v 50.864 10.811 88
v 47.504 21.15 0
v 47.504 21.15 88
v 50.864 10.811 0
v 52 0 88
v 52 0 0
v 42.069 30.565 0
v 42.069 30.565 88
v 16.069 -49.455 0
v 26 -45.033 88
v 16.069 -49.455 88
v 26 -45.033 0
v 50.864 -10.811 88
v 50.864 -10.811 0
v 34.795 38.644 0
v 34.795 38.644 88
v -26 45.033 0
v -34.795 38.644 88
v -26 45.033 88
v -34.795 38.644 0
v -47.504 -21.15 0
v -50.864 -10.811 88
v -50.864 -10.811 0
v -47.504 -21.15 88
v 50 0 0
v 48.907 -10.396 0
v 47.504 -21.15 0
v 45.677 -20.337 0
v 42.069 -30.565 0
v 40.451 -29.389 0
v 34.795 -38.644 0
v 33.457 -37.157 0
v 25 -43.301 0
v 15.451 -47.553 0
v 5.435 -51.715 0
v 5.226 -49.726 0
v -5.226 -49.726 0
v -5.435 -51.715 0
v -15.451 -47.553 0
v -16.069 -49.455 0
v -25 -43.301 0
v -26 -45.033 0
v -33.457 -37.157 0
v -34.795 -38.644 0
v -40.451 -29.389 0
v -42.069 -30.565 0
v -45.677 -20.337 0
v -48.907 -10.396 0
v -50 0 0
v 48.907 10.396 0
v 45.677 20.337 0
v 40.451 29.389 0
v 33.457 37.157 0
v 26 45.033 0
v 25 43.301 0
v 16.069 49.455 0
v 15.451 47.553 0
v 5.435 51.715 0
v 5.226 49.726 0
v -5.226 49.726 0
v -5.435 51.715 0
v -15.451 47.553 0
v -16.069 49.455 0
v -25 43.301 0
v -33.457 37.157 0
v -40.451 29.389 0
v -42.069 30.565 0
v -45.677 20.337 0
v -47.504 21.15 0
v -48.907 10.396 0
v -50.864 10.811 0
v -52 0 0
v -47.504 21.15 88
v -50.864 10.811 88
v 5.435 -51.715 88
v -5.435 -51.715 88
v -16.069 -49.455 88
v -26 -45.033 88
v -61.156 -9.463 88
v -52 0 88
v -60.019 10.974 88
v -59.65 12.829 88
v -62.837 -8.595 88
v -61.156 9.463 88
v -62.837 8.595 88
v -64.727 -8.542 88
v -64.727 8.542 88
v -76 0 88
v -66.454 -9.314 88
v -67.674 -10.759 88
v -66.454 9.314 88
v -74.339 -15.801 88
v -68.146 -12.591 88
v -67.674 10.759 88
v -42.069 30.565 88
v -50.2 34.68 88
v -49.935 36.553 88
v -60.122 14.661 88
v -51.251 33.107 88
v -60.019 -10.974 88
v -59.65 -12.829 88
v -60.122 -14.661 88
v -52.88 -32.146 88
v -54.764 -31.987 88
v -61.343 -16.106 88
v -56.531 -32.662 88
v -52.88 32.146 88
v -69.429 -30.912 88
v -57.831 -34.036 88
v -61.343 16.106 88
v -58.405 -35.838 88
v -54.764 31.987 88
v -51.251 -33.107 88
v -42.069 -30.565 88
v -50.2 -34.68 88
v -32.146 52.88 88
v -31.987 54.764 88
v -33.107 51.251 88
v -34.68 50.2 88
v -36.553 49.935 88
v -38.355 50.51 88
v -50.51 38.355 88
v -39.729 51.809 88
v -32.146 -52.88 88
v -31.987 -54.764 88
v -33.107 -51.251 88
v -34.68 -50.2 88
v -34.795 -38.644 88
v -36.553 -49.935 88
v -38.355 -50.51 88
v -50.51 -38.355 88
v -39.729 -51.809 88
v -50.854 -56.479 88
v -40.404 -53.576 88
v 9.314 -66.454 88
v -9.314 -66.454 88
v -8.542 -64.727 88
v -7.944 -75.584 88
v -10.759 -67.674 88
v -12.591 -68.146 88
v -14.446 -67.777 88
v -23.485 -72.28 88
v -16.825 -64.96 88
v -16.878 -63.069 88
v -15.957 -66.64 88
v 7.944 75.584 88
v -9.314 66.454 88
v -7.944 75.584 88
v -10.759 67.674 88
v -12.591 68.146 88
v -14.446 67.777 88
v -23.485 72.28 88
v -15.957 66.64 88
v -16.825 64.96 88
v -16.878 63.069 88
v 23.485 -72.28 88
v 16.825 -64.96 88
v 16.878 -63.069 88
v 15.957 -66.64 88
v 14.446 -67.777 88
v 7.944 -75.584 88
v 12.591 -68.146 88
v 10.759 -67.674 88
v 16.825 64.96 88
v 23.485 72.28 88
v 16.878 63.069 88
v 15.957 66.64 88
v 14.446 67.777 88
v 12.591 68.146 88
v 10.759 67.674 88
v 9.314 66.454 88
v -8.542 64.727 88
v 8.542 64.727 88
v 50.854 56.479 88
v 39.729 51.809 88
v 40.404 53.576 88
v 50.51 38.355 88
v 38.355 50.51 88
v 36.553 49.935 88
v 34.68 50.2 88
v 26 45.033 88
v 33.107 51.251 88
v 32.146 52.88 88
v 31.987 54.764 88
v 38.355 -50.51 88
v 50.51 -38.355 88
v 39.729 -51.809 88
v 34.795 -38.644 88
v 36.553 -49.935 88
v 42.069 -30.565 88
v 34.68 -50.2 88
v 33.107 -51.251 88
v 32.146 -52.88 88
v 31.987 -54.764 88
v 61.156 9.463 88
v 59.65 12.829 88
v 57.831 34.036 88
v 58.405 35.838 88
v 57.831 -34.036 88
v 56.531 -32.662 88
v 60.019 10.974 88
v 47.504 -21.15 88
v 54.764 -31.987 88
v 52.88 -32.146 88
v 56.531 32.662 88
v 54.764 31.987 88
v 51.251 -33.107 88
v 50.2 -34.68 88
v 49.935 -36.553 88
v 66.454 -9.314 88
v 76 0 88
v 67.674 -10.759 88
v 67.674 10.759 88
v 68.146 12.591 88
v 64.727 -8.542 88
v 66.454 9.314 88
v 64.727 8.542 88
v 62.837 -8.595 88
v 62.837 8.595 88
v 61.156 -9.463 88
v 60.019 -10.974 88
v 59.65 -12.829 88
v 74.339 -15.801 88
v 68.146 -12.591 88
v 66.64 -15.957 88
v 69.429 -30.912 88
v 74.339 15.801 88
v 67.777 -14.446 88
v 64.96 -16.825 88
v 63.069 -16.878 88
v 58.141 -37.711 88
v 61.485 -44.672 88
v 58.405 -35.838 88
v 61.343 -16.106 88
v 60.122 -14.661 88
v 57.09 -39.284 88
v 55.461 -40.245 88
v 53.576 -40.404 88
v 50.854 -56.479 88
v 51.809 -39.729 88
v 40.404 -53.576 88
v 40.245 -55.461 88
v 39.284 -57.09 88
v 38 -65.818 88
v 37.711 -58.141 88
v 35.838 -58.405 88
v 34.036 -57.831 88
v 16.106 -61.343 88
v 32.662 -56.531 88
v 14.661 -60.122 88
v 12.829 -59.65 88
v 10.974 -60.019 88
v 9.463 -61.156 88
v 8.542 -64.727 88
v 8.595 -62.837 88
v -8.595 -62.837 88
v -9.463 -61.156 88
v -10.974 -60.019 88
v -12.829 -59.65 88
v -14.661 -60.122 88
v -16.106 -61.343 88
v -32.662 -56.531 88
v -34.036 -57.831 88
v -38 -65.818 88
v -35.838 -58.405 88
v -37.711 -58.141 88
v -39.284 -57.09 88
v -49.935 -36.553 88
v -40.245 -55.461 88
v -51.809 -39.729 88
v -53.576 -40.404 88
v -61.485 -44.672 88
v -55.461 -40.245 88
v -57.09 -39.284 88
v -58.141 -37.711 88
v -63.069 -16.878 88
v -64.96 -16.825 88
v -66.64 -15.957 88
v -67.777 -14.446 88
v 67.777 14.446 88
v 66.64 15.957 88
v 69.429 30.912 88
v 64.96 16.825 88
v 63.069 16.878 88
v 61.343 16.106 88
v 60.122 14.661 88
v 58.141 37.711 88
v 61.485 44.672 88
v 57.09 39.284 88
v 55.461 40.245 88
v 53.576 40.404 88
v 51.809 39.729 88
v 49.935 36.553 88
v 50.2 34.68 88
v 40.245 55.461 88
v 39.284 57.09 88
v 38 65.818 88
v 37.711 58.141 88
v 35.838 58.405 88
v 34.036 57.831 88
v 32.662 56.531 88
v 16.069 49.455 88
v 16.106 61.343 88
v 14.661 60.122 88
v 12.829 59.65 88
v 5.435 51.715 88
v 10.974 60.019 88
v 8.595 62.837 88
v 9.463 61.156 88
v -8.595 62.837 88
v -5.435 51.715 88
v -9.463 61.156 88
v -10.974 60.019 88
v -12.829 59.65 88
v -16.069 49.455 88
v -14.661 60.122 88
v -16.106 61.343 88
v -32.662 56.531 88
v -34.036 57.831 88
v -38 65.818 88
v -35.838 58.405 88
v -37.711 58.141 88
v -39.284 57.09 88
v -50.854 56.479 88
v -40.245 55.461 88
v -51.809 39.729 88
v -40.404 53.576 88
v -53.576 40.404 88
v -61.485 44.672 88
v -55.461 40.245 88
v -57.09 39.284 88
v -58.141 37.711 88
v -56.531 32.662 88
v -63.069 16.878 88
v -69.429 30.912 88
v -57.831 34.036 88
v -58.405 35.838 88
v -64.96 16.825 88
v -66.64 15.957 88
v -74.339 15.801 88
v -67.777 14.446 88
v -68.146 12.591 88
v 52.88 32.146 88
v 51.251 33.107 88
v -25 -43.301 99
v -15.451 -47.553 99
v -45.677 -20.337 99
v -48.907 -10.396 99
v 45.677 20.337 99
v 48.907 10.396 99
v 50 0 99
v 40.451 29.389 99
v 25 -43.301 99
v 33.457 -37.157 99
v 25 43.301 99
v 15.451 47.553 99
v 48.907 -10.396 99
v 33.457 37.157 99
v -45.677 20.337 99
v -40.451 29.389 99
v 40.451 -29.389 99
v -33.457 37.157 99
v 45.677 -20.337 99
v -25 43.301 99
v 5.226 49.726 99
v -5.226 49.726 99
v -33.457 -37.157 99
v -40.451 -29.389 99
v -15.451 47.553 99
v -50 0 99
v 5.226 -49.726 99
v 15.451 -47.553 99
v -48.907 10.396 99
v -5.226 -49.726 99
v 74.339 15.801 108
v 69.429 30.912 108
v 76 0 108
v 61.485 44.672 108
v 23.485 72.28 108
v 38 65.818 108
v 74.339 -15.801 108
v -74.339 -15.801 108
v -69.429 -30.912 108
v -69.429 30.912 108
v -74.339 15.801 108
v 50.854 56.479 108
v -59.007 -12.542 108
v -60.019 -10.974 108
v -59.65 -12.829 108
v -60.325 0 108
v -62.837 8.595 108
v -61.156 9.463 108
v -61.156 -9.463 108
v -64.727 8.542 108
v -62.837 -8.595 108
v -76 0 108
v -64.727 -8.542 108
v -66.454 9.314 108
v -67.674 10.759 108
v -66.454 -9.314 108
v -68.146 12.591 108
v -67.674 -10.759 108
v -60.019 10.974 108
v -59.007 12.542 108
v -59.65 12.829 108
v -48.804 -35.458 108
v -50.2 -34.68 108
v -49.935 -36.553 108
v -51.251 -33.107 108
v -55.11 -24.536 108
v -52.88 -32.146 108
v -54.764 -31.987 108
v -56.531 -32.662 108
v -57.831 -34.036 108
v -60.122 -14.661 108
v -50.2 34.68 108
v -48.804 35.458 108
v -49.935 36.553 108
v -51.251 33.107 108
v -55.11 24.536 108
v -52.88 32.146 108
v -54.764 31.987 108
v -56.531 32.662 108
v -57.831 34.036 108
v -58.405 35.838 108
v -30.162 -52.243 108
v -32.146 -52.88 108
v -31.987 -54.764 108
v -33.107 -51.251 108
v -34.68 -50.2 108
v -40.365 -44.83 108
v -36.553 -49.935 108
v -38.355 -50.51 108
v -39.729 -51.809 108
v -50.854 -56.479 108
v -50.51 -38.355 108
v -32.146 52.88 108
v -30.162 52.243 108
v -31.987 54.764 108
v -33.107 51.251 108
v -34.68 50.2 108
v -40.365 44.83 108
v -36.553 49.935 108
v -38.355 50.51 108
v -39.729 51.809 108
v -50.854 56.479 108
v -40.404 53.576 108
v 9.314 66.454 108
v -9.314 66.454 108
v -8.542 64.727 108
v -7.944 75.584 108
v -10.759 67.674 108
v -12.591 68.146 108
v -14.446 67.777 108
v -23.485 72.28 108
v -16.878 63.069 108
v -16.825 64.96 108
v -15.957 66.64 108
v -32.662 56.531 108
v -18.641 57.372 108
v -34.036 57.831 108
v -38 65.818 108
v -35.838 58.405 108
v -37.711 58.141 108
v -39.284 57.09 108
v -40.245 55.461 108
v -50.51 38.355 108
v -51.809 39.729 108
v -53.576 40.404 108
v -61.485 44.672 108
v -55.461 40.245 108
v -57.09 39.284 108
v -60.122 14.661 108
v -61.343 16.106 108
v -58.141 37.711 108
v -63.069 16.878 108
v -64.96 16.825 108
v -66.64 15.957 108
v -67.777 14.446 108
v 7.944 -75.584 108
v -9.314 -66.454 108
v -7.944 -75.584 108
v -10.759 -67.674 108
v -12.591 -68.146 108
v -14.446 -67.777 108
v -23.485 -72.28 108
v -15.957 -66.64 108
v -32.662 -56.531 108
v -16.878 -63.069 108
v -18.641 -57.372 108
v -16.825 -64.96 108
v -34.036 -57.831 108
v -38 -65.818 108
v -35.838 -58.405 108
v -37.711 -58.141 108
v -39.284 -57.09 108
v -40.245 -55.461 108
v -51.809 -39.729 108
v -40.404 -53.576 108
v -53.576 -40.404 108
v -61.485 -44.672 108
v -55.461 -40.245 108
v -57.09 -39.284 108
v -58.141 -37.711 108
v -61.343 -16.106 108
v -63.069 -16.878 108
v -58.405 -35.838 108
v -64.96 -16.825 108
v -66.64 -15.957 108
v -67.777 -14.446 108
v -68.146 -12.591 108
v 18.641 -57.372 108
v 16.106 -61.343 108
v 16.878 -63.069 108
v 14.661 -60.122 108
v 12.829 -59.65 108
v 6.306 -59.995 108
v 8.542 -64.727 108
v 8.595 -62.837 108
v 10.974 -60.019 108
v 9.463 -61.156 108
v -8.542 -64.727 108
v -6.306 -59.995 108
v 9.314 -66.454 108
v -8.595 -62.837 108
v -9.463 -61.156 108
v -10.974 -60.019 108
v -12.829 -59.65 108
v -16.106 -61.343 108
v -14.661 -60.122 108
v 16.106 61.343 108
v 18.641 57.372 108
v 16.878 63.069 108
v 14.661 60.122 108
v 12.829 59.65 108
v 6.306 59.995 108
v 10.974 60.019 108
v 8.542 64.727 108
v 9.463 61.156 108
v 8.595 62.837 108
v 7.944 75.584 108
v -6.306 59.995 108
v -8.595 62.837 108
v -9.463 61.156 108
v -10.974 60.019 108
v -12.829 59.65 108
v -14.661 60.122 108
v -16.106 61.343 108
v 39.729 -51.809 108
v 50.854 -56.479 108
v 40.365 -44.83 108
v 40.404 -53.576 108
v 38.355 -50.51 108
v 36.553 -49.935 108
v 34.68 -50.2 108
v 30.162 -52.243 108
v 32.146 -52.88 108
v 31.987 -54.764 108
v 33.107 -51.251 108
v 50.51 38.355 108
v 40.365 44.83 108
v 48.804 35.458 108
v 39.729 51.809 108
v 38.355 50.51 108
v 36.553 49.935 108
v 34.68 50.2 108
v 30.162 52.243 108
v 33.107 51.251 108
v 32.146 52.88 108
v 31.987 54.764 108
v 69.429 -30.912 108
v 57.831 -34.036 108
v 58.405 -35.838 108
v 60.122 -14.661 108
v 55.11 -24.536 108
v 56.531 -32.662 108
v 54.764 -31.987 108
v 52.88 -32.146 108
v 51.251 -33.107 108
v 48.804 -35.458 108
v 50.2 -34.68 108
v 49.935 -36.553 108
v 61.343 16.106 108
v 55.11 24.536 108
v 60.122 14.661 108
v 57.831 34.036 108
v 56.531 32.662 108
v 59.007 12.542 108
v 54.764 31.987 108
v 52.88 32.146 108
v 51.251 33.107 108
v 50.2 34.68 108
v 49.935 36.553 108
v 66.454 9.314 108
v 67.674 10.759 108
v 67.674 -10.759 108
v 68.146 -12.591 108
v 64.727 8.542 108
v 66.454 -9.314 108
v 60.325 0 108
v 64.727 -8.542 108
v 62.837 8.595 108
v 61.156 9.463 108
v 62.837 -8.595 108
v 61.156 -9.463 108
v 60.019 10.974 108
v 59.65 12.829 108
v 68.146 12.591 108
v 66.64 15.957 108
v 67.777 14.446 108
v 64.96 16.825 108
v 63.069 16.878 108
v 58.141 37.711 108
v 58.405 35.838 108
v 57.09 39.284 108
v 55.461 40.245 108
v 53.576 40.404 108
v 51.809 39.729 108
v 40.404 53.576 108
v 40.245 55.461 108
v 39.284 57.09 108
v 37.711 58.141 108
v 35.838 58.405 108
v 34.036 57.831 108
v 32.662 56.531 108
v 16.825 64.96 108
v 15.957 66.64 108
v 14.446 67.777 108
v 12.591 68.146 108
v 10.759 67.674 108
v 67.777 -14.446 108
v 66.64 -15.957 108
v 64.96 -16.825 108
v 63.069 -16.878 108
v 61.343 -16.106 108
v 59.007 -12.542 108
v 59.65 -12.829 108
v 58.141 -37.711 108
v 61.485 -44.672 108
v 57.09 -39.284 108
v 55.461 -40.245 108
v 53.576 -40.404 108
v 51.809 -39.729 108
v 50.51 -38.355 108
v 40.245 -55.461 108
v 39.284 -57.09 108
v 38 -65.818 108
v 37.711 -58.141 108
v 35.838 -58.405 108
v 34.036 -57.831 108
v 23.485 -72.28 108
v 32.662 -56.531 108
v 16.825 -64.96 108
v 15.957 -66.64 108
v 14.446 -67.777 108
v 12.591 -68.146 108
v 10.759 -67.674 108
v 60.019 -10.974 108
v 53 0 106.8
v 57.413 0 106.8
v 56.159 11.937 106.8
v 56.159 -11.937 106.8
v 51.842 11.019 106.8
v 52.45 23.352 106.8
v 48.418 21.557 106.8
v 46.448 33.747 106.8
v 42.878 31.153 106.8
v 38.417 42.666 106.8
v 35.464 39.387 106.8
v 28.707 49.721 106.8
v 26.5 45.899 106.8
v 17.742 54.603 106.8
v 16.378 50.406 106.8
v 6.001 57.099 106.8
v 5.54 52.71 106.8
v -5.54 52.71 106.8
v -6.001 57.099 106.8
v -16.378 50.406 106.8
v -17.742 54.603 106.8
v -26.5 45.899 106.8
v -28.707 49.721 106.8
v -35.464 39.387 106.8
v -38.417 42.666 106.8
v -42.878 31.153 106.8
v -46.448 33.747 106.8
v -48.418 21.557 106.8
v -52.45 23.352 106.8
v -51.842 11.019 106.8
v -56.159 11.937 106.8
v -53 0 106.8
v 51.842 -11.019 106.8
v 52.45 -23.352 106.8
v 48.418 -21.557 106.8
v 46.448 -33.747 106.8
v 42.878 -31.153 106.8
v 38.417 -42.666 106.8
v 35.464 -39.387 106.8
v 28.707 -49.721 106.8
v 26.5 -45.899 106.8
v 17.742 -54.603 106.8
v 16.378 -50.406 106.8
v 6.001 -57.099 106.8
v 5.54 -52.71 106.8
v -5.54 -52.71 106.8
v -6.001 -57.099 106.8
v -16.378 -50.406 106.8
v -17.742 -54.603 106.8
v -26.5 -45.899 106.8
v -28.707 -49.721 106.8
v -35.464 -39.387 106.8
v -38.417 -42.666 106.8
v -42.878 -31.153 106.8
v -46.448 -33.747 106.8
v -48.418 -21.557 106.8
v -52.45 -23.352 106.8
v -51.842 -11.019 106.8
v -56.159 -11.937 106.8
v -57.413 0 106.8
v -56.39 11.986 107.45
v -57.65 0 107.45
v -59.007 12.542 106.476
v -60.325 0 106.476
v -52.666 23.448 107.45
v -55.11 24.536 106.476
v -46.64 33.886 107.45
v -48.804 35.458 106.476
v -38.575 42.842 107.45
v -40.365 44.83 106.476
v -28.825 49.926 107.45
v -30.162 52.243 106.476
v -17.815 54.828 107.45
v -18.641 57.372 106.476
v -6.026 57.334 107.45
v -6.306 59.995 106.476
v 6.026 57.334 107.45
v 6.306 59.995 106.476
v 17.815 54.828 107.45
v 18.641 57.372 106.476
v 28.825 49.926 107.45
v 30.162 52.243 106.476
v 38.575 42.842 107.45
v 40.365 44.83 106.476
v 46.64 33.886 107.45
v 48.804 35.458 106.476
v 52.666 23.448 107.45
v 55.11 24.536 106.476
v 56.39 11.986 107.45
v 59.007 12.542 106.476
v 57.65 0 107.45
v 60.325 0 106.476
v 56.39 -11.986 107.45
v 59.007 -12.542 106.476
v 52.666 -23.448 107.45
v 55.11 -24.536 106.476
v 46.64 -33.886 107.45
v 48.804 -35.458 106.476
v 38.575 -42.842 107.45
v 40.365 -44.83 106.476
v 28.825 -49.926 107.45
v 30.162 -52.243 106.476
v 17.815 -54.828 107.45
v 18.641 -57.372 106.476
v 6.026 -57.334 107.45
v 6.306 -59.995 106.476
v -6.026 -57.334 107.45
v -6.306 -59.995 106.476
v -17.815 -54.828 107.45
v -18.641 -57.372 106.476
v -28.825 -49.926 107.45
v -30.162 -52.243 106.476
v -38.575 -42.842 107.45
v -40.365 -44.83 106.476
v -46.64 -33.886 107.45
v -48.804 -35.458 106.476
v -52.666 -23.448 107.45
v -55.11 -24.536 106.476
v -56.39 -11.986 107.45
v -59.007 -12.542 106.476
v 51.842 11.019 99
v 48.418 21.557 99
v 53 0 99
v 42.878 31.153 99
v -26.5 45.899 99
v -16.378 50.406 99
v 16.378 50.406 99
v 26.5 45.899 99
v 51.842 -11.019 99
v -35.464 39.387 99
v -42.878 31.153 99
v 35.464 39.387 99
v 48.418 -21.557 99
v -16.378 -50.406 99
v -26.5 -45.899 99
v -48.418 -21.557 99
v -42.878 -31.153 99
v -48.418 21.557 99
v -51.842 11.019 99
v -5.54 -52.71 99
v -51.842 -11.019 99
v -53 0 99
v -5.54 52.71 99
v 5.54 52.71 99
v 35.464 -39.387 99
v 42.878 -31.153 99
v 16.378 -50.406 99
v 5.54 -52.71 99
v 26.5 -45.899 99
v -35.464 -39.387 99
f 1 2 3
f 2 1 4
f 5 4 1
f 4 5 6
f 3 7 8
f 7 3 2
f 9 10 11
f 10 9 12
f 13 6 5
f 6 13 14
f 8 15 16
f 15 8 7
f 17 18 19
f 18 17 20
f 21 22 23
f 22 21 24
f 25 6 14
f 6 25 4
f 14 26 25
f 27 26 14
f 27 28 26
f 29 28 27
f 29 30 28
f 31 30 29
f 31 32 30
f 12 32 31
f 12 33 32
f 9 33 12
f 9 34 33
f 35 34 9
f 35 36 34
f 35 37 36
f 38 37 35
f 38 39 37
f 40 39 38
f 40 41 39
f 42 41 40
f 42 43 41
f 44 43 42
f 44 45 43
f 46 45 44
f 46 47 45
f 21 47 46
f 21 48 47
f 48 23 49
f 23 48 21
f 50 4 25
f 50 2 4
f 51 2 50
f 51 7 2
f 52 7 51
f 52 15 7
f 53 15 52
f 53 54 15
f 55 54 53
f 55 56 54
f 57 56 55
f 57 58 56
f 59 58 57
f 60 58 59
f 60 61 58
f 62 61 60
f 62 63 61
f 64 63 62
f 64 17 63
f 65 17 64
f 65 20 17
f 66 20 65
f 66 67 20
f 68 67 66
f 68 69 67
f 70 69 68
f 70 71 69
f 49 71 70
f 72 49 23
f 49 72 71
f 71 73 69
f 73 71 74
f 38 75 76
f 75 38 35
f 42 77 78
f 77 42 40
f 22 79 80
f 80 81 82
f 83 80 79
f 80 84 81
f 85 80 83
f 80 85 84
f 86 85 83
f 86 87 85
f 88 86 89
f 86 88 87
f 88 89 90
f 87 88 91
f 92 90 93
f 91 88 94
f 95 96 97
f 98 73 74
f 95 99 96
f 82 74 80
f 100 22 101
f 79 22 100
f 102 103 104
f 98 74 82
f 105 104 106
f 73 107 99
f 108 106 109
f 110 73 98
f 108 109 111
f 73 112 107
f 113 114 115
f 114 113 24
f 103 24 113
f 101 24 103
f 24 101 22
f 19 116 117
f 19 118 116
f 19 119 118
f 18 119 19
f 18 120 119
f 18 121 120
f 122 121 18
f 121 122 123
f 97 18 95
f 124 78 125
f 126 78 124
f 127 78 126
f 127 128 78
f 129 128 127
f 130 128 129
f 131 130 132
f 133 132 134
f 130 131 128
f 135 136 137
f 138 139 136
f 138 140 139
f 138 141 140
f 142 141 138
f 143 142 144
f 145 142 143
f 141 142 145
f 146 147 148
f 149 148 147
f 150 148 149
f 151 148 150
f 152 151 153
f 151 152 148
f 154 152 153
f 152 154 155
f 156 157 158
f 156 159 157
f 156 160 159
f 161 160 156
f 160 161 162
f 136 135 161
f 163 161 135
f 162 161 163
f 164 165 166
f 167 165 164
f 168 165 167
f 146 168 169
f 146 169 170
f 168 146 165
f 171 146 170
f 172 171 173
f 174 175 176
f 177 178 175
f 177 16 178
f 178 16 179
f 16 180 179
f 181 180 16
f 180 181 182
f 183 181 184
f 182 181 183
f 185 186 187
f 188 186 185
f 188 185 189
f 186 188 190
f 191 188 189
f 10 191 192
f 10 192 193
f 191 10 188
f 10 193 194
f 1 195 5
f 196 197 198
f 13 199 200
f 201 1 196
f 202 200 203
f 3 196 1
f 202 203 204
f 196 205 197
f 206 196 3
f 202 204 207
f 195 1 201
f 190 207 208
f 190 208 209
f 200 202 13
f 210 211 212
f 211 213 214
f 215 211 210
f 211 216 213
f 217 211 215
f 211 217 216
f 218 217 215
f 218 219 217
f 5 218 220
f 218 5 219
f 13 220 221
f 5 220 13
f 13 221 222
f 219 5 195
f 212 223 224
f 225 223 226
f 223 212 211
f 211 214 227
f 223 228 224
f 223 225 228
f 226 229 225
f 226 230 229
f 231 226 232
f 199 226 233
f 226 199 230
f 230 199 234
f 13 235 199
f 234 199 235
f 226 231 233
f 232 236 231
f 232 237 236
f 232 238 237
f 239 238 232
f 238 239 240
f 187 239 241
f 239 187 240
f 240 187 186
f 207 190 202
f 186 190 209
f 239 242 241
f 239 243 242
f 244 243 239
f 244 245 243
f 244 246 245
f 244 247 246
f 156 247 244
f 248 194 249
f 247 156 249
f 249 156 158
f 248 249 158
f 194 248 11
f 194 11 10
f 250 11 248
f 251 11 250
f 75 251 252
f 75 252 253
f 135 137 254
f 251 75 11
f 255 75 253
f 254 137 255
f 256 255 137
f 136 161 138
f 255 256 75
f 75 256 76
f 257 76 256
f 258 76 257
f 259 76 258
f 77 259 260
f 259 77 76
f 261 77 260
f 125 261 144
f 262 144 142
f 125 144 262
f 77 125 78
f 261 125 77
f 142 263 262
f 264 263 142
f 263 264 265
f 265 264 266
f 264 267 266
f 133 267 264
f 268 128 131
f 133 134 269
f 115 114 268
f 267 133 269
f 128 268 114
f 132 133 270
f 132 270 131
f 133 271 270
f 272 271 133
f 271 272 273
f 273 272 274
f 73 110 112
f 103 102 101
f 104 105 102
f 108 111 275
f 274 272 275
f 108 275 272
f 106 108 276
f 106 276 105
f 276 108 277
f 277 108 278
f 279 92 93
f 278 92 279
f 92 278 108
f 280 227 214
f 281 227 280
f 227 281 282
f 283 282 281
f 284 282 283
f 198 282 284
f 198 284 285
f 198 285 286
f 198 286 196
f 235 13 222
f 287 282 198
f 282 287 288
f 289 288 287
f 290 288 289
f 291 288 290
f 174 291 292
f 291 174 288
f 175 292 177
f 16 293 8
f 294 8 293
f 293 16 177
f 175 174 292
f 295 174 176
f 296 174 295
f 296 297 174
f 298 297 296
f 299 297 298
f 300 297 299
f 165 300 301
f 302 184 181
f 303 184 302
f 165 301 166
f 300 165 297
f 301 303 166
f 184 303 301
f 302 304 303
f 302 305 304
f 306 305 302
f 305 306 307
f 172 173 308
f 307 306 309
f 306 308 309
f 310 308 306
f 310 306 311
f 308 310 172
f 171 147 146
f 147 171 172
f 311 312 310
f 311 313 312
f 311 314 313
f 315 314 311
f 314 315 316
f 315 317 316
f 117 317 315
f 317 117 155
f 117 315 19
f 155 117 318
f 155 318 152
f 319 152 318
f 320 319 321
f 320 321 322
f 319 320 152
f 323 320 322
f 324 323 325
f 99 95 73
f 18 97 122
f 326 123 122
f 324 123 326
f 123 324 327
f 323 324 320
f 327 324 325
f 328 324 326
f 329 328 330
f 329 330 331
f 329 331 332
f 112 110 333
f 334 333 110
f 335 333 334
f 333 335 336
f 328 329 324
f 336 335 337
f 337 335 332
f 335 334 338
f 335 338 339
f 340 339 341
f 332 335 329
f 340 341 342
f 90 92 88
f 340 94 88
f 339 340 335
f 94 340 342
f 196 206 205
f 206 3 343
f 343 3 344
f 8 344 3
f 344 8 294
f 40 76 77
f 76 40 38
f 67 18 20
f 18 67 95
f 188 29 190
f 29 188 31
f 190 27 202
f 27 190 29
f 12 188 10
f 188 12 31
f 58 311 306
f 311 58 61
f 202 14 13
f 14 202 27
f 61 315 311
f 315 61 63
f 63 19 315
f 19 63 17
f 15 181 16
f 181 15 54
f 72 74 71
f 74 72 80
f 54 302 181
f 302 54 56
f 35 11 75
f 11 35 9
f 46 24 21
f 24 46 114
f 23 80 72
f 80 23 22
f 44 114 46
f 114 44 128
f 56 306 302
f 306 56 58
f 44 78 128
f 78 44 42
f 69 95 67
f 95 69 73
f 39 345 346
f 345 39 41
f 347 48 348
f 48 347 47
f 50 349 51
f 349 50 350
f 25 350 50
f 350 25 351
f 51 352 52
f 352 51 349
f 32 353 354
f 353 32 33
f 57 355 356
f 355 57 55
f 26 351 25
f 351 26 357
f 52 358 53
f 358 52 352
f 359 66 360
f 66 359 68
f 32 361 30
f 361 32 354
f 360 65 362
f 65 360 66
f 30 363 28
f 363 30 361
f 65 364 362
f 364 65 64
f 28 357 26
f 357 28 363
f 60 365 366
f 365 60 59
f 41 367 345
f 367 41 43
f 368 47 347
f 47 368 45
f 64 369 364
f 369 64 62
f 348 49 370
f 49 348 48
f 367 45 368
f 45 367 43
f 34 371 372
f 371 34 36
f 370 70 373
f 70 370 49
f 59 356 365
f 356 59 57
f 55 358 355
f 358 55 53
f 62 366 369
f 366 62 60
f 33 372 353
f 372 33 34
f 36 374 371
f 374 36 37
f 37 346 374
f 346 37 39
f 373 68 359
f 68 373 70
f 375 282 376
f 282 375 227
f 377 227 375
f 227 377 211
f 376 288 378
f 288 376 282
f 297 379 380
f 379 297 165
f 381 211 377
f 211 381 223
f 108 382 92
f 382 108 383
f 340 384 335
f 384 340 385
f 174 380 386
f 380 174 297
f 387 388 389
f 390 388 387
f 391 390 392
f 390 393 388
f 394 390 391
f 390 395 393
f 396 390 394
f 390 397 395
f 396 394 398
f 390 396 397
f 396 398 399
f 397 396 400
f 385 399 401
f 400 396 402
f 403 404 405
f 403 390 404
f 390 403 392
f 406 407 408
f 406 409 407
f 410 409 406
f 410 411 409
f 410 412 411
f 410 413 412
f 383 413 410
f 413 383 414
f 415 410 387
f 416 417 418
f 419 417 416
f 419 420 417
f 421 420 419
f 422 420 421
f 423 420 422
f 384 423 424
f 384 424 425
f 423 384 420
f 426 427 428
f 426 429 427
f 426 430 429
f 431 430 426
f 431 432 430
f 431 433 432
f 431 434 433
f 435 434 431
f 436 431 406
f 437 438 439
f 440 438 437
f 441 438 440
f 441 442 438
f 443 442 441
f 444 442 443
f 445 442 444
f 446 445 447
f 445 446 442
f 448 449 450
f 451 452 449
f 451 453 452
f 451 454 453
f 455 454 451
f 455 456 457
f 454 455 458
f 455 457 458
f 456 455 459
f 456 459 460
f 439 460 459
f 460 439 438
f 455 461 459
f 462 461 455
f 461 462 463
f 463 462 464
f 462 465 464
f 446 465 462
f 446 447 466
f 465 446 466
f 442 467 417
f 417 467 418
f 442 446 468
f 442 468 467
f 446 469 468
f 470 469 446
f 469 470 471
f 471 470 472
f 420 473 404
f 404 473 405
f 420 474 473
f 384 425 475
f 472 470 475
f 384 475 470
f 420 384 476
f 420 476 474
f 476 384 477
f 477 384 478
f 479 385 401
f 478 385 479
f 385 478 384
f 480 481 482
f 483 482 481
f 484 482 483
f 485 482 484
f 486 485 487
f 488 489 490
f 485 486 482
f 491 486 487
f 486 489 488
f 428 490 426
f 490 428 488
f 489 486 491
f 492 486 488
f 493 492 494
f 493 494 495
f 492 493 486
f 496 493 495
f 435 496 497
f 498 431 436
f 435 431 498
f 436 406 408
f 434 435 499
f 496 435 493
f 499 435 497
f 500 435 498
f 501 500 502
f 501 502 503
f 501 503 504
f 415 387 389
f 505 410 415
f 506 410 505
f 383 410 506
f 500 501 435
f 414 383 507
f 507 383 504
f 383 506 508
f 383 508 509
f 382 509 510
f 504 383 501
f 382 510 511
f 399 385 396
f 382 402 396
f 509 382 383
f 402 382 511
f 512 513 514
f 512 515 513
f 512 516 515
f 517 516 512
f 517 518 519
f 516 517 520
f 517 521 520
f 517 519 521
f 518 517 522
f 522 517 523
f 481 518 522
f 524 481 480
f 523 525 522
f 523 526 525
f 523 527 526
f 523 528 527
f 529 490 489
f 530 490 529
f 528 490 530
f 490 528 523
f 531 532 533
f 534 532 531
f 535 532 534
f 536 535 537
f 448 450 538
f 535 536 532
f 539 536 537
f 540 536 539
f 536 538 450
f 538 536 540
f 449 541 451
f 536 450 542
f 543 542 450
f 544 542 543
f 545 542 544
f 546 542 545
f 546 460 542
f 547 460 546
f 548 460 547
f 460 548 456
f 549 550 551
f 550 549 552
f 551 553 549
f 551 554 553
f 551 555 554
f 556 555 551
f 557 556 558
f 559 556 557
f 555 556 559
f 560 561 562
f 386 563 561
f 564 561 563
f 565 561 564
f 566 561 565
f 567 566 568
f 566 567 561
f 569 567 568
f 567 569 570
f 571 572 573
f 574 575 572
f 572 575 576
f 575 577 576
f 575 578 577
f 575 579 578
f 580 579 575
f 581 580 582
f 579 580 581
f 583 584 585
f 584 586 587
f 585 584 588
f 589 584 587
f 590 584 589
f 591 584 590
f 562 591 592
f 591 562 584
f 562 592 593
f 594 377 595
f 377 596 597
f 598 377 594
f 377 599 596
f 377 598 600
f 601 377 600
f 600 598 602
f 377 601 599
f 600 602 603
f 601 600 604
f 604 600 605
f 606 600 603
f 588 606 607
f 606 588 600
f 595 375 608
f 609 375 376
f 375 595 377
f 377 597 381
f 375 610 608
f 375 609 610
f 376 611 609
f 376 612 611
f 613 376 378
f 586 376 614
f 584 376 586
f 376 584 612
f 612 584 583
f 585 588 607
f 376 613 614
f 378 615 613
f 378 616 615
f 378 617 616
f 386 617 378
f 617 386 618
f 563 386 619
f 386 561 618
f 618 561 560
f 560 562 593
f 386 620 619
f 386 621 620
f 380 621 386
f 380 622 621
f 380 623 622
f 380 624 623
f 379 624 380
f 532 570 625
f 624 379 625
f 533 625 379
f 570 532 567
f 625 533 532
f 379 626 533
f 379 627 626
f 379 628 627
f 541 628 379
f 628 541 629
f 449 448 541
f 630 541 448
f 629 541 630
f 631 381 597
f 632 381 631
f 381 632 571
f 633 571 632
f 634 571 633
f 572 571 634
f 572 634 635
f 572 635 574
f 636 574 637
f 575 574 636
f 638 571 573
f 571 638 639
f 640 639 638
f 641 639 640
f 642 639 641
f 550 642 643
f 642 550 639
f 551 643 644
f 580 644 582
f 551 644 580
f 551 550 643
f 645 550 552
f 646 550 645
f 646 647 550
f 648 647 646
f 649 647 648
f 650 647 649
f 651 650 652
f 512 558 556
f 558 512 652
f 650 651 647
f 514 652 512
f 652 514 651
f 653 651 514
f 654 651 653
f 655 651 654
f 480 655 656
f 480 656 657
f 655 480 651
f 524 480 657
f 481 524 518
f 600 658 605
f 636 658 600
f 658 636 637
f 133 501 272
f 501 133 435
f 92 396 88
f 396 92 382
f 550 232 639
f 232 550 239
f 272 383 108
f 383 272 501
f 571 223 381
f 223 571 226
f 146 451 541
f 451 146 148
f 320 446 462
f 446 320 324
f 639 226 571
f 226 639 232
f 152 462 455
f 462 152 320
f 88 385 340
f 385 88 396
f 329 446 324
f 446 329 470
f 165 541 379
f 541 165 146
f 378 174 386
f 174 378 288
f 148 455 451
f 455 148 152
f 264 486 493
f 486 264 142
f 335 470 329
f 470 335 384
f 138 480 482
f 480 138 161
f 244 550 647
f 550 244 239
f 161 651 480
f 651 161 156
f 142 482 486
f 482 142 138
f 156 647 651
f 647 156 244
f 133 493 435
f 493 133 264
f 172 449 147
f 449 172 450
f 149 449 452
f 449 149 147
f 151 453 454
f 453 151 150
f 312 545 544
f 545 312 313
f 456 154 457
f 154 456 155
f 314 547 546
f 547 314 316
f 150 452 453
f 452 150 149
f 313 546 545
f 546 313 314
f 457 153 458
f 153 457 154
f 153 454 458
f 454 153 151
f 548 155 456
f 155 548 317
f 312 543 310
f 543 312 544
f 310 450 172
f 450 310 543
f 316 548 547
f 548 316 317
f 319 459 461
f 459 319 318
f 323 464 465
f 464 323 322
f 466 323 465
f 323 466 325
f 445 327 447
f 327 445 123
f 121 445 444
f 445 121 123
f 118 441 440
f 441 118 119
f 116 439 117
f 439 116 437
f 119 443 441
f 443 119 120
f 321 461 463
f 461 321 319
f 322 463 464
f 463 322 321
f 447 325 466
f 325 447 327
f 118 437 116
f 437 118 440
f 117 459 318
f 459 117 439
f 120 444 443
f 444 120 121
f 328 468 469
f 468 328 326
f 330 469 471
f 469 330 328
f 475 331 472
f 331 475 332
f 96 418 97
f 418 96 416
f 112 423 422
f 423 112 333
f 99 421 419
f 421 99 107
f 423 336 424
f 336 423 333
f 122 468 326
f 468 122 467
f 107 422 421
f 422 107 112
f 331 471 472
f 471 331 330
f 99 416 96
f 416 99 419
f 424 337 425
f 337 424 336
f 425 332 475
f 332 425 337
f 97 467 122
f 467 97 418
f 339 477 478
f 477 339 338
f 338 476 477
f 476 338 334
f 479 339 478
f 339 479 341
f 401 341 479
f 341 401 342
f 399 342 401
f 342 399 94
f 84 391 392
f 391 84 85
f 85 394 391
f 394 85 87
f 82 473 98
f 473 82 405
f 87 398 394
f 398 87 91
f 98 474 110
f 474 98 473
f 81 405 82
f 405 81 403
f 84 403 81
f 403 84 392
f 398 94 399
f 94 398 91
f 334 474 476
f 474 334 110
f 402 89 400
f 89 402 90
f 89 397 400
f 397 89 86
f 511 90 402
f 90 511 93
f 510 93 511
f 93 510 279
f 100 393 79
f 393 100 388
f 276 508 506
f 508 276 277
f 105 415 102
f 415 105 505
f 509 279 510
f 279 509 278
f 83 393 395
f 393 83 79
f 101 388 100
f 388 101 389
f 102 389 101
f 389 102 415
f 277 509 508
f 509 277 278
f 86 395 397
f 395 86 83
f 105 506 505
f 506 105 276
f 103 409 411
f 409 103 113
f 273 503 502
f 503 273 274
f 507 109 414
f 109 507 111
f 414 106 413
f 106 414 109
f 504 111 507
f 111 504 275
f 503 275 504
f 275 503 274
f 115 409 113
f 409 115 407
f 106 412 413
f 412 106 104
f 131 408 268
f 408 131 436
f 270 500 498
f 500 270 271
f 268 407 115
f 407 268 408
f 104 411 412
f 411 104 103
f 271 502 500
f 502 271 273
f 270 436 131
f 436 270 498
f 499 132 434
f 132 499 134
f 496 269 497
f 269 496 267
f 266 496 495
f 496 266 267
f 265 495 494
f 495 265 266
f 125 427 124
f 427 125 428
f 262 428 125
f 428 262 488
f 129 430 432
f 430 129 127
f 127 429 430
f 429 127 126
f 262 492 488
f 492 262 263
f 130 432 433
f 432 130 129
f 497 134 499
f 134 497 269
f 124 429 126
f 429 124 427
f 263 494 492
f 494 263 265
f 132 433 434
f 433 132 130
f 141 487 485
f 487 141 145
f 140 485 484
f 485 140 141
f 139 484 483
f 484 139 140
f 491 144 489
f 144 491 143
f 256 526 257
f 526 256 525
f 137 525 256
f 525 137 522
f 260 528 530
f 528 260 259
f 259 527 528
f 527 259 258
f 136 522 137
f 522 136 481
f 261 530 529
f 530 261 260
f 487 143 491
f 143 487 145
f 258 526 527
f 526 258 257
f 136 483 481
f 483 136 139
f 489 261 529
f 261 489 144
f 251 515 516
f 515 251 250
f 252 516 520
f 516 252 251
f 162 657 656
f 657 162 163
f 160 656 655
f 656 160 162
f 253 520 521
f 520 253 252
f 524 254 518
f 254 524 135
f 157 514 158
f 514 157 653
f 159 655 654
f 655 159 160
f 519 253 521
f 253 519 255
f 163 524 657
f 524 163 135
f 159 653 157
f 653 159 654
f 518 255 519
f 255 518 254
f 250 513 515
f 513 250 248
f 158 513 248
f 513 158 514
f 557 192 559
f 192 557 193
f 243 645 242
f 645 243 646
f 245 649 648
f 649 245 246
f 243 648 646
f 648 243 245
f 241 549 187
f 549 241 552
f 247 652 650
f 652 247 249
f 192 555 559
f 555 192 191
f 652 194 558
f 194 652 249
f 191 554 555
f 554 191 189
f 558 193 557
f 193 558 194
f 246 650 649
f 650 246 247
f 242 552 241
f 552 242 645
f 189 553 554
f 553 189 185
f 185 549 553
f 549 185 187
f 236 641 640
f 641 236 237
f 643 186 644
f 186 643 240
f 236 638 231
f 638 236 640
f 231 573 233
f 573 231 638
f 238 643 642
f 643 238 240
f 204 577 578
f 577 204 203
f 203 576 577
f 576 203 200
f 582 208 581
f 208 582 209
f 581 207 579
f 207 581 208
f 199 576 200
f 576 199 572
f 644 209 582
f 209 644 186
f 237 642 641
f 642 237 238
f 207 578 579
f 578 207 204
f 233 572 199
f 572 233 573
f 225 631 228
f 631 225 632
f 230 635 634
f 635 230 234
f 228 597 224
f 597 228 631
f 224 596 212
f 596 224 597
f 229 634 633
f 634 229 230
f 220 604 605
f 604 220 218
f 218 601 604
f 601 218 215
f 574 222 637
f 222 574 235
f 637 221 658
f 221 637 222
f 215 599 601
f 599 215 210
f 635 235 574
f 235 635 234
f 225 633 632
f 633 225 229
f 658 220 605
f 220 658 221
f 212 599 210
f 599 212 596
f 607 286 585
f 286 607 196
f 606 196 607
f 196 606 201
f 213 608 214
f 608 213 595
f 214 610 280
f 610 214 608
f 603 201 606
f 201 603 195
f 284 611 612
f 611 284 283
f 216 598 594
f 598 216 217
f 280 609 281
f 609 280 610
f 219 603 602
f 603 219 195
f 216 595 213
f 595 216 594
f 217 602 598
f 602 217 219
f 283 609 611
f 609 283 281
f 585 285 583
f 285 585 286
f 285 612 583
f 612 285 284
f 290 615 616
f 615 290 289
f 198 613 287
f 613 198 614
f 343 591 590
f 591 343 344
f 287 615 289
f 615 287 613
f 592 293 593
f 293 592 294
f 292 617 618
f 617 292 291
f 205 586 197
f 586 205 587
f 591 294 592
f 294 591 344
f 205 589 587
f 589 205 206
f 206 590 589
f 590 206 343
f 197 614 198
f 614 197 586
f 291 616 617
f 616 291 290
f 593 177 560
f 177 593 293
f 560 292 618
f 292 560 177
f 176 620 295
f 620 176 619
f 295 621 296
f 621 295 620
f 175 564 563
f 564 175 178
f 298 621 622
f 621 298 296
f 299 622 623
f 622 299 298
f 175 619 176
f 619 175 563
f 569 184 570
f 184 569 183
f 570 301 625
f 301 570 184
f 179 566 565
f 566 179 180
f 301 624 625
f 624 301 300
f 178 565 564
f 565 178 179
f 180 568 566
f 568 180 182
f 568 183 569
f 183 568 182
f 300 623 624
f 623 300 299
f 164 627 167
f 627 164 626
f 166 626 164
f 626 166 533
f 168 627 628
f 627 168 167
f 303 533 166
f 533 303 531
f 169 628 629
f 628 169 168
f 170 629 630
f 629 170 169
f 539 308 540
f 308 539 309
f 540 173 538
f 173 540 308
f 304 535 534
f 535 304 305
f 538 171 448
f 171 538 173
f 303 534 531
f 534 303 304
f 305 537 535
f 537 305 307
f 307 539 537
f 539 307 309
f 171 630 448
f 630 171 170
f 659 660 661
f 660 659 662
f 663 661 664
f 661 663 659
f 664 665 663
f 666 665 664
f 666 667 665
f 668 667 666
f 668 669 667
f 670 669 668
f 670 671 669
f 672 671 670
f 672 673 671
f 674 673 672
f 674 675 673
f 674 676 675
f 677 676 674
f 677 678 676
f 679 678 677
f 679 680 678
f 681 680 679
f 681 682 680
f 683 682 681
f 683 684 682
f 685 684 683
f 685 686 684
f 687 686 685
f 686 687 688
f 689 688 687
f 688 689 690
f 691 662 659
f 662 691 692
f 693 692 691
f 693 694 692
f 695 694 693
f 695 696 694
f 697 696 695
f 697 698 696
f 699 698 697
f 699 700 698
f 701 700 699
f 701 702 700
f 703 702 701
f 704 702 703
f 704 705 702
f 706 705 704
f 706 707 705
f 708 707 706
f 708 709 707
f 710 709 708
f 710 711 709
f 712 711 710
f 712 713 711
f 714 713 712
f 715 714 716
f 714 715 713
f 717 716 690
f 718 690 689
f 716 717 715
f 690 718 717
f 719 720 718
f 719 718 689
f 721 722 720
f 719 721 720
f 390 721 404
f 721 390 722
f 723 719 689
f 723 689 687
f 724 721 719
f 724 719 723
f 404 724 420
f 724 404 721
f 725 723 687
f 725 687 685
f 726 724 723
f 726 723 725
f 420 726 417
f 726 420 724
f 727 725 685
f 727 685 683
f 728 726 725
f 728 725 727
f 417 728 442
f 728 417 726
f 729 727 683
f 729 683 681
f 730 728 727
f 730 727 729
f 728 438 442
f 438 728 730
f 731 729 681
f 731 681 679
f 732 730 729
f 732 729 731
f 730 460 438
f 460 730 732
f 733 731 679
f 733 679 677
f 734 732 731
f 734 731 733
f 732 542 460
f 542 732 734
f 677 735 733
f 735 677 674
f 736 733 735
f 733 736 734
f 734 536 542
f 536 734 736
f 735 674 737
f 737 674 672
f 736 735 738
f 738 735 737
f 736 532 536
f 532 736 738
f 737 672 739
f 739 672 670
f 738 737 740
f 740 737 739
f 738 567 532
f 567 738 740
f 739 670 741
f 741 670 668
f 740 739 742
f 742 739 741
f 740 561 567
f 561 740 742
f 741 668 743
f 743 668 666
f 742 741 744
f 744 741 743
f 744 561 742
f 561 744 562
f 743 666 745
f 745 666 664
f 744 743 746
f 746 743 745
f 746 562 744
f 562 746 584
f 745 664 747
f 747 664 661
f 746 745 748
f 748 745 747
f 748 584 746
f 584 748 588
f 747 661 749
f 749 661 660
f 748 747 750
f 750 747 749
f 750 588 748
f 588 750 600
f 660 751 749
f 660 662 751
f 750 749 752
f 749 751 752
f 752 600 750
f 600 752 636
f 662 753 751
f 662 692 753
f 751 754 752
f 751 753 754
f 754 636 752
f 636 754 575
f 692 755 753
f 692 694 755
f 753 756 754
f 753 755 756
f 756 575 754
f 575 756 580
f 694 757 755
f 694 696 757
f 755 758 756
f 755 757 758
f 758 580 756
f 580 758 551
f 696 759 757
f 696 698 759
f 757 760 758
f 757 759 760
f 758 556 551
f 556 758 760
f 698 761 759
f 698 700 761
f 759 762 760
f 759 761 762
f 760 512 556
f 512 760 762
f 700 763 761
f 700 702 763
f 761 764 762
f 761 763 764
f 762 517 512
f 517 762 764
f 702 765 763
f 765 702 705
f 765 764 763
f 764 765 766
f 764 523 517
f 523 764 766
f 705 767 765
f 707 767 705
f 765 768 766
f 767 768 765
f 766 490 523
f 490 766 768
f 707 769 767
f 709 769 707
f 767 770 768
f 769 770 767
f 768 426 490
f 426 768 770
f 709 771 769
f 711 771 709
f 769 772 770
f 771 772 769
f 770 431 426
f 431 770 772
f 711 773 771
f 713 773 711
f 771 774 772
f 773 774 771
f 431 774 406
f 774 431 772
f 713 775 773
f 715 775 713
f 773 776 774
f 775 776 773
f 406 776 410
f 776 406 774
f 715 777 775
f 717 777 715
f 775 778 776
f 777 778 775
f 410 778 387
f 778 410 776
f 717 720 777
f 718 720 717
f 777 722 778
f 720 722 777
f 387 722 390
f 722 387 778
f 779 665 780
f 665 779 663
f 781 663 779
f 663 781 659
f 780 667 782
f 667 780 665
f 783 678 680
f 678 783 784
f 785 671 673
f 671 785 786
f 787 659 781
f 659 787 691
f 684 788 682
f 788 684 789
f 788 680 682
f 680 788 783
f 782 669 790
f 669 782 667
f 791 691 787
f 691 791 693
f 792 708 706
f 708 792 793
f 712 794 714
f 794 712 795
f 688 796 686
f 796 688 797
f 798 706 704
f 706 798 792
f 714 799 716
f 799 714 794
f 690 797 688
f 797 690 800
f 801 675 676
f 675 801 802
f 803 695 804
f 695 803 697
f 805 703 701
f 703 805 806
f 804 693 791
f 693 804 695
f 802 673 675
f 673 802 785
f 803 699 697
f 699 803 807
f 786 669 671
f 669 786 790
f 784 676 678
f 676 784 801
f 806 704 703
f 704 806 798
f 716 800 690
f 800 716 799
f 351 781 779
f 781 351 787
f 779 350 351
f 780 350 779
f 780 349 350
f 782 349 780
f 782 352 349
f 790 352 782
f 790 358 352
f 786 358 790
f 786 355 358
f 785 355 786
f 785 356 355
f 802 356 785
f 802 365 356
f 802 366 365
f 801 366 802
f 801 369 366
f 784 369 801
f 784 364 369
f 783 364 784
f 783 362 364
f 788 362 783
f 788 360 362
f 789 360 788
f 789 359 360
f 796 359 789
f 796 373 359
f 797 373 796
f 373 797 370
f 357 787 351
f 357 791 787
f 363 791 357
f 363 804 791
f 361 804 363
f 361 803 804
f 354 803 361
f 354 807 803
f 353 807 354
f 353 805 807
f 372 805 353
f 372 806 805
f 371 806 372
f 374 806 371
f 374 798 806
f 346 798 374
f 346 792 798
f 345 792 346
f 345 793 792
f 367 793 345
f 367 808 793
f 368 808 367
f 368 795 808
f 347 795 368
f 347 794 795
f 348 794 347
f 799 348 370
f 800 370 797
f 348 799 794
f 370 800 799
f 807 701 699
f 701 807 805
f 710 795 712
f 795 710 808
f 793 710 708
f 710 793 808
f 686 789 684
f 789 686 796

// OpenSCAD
/*
CF vacuum flanges for OpenSCAD
This is free and unencumbered software released into the public domain.

Anyone is free to copy, modify, publish, use, compile, sell, or
distribute this software, either in source code form or as a compiled
binary, for any purpose, commercial or non-commercial, and by any
means.

In jurisdictions that recognize copyright laws, the author or authors
of this software dedicate any and all copyright interest in the
software to the public domain. We make this dedication for the benefit
of the public at large and to the detriment of our heirs and
successors. We intend this dedication to be an overt act of
relinquishment in perpetuity of all present and future rights to this
software under copyright law.

THE SOFTWARE IS PROVIDED "AS IS", WITHOUT WARRANTY OF ANY KIND,
EXPRESS OR IMPLIED, INCLUDING BUT NOT LIMITED TO THE WARRANTIES OF
MERCHANTABILITY, FITNESS FOR A PARTICULAR PURPOSE AND NONINFRINGEMENT.
IN NO EVENT SHALL THE AUTHORS BE LIABLE FOR ANY CLAIM, DAMAGES OR
OTHER LIABILITY, WHETHER IN AN ACTION OF CONTRACT, TORT OR OTHERWISE,
ARISING FROM, OUT OF OR IN CONNECTION WITH THE SOFTWARE OR THE USE OR
OTHER DEALINGS IN THE SOFTWARE.

For more information, please refer to <https://unlicense.org/>

Based on blueprints from https://www.tracepartsonline.net/(S(c314dufymcnxxurthiwo4pow))/PartDetails.aspx?PartFamilyID=30-03062015-098588&PartID=30-03062015-098588 (the link is dead at the time of this PR to NopSCADlib), but should not be copyrightable, since CF is a de-facto standard + the stuff is made of simple geometrical shapes + the file has been created myself, looking at the blueprint.

*/

module cylRing(d1, d2, h) {
	if (d2 > 0) {
		difference() {
			cylinder(h = h, d = d1);
			cylinder(h = h, d = d2);
		}
	} else {
		cylinder(h = h, d = d1);
	}
}

module createRidgeTorus(ridgeH = 0.65, ridgeAngle = 70, dRidge = 115.3, dRidgeEnd = 120.65, ridgeDepth = 1.2) {
	rRidge = dRidge / 2;
	rRidgeEnd = dRidgeEnd / 2;
	rotate_extrude()
		polygon(points = [
			[0, 0],
			[0, -ridgeDepth],
			[rRidge - ridgeH * tan(90 - ridgeAngle), -ridgeDepth],
			[rRidge,  - (ridgeDepth - ridgeH)],
			[rRidgeEnd,  - (ridgeDepth - ridgeH + (rRidgeEnd - rRidge) / tan(ridgeAngle))],
			[rRidgeEnd, 0]
		]);
}

module createHoles(holeDiamiter = 8.5, holeCount = 8 * 2, holeTrDiameter = 130.3, flangeSize = 20) {
	for (i = [0 : holeCount - 1]) {
		rotate((i + 1 / 2) * 360 / holeCount, [0, 0, 1])
			translate([0, holeTrDiameter / 2])
				cylinder(d = holeDiamiter, h = flangeSize);
	}
}

module CFBlankFlange(flangeDiameter = 152, holeDiameter = 0, flangeSize = 20, holeTrDiameter = 130.3) {
	group() {
		difference() {
			cylRing(d1 = flangeDiameter, d2 = holeDiameter, h = flangeSize);
			createHoles(flangeSize = flangeSize, holeTrDiameter = holeTrDiameter);
			translate([0, 0, flangeSize])
				createRidgeTorus();
		}
	}
}

module CFFlange(partLen = 108.0,
	innerDiameter = 100,
	outerDiameter = 104,
	flangeDiameter = 152,
	flangeSize = 20,
	grooveRadius = 1.5,
	openingDepth = 9,
	openingDiameter = 106,
	holeDiameter = 0,
	holeTrDiameter = 130.3) {

	middleSegmentSize = partLen - flangeSize;

	group() {
		difference() {
			difference() {
				union() {
					cylRing(h = middleSegmentSize, d1 = outerDiameter, d2 = innerDiameter);
					translate([0, 0, middleSegmentSize])
						CFBlankFlange(flangeDiameter = flangeDiameter, holeDiameter = innerDiameter, flangeSize = flangeSize, holeTrDiameter = holeTrDiameter);
				}

				translate([0, 0, partLen - openingDepth])
					cylinder(d = openingDiameter, h = openingDepth);
			}
		}
	}
}

CFFlange();  // this file is meant to be imported, not included
